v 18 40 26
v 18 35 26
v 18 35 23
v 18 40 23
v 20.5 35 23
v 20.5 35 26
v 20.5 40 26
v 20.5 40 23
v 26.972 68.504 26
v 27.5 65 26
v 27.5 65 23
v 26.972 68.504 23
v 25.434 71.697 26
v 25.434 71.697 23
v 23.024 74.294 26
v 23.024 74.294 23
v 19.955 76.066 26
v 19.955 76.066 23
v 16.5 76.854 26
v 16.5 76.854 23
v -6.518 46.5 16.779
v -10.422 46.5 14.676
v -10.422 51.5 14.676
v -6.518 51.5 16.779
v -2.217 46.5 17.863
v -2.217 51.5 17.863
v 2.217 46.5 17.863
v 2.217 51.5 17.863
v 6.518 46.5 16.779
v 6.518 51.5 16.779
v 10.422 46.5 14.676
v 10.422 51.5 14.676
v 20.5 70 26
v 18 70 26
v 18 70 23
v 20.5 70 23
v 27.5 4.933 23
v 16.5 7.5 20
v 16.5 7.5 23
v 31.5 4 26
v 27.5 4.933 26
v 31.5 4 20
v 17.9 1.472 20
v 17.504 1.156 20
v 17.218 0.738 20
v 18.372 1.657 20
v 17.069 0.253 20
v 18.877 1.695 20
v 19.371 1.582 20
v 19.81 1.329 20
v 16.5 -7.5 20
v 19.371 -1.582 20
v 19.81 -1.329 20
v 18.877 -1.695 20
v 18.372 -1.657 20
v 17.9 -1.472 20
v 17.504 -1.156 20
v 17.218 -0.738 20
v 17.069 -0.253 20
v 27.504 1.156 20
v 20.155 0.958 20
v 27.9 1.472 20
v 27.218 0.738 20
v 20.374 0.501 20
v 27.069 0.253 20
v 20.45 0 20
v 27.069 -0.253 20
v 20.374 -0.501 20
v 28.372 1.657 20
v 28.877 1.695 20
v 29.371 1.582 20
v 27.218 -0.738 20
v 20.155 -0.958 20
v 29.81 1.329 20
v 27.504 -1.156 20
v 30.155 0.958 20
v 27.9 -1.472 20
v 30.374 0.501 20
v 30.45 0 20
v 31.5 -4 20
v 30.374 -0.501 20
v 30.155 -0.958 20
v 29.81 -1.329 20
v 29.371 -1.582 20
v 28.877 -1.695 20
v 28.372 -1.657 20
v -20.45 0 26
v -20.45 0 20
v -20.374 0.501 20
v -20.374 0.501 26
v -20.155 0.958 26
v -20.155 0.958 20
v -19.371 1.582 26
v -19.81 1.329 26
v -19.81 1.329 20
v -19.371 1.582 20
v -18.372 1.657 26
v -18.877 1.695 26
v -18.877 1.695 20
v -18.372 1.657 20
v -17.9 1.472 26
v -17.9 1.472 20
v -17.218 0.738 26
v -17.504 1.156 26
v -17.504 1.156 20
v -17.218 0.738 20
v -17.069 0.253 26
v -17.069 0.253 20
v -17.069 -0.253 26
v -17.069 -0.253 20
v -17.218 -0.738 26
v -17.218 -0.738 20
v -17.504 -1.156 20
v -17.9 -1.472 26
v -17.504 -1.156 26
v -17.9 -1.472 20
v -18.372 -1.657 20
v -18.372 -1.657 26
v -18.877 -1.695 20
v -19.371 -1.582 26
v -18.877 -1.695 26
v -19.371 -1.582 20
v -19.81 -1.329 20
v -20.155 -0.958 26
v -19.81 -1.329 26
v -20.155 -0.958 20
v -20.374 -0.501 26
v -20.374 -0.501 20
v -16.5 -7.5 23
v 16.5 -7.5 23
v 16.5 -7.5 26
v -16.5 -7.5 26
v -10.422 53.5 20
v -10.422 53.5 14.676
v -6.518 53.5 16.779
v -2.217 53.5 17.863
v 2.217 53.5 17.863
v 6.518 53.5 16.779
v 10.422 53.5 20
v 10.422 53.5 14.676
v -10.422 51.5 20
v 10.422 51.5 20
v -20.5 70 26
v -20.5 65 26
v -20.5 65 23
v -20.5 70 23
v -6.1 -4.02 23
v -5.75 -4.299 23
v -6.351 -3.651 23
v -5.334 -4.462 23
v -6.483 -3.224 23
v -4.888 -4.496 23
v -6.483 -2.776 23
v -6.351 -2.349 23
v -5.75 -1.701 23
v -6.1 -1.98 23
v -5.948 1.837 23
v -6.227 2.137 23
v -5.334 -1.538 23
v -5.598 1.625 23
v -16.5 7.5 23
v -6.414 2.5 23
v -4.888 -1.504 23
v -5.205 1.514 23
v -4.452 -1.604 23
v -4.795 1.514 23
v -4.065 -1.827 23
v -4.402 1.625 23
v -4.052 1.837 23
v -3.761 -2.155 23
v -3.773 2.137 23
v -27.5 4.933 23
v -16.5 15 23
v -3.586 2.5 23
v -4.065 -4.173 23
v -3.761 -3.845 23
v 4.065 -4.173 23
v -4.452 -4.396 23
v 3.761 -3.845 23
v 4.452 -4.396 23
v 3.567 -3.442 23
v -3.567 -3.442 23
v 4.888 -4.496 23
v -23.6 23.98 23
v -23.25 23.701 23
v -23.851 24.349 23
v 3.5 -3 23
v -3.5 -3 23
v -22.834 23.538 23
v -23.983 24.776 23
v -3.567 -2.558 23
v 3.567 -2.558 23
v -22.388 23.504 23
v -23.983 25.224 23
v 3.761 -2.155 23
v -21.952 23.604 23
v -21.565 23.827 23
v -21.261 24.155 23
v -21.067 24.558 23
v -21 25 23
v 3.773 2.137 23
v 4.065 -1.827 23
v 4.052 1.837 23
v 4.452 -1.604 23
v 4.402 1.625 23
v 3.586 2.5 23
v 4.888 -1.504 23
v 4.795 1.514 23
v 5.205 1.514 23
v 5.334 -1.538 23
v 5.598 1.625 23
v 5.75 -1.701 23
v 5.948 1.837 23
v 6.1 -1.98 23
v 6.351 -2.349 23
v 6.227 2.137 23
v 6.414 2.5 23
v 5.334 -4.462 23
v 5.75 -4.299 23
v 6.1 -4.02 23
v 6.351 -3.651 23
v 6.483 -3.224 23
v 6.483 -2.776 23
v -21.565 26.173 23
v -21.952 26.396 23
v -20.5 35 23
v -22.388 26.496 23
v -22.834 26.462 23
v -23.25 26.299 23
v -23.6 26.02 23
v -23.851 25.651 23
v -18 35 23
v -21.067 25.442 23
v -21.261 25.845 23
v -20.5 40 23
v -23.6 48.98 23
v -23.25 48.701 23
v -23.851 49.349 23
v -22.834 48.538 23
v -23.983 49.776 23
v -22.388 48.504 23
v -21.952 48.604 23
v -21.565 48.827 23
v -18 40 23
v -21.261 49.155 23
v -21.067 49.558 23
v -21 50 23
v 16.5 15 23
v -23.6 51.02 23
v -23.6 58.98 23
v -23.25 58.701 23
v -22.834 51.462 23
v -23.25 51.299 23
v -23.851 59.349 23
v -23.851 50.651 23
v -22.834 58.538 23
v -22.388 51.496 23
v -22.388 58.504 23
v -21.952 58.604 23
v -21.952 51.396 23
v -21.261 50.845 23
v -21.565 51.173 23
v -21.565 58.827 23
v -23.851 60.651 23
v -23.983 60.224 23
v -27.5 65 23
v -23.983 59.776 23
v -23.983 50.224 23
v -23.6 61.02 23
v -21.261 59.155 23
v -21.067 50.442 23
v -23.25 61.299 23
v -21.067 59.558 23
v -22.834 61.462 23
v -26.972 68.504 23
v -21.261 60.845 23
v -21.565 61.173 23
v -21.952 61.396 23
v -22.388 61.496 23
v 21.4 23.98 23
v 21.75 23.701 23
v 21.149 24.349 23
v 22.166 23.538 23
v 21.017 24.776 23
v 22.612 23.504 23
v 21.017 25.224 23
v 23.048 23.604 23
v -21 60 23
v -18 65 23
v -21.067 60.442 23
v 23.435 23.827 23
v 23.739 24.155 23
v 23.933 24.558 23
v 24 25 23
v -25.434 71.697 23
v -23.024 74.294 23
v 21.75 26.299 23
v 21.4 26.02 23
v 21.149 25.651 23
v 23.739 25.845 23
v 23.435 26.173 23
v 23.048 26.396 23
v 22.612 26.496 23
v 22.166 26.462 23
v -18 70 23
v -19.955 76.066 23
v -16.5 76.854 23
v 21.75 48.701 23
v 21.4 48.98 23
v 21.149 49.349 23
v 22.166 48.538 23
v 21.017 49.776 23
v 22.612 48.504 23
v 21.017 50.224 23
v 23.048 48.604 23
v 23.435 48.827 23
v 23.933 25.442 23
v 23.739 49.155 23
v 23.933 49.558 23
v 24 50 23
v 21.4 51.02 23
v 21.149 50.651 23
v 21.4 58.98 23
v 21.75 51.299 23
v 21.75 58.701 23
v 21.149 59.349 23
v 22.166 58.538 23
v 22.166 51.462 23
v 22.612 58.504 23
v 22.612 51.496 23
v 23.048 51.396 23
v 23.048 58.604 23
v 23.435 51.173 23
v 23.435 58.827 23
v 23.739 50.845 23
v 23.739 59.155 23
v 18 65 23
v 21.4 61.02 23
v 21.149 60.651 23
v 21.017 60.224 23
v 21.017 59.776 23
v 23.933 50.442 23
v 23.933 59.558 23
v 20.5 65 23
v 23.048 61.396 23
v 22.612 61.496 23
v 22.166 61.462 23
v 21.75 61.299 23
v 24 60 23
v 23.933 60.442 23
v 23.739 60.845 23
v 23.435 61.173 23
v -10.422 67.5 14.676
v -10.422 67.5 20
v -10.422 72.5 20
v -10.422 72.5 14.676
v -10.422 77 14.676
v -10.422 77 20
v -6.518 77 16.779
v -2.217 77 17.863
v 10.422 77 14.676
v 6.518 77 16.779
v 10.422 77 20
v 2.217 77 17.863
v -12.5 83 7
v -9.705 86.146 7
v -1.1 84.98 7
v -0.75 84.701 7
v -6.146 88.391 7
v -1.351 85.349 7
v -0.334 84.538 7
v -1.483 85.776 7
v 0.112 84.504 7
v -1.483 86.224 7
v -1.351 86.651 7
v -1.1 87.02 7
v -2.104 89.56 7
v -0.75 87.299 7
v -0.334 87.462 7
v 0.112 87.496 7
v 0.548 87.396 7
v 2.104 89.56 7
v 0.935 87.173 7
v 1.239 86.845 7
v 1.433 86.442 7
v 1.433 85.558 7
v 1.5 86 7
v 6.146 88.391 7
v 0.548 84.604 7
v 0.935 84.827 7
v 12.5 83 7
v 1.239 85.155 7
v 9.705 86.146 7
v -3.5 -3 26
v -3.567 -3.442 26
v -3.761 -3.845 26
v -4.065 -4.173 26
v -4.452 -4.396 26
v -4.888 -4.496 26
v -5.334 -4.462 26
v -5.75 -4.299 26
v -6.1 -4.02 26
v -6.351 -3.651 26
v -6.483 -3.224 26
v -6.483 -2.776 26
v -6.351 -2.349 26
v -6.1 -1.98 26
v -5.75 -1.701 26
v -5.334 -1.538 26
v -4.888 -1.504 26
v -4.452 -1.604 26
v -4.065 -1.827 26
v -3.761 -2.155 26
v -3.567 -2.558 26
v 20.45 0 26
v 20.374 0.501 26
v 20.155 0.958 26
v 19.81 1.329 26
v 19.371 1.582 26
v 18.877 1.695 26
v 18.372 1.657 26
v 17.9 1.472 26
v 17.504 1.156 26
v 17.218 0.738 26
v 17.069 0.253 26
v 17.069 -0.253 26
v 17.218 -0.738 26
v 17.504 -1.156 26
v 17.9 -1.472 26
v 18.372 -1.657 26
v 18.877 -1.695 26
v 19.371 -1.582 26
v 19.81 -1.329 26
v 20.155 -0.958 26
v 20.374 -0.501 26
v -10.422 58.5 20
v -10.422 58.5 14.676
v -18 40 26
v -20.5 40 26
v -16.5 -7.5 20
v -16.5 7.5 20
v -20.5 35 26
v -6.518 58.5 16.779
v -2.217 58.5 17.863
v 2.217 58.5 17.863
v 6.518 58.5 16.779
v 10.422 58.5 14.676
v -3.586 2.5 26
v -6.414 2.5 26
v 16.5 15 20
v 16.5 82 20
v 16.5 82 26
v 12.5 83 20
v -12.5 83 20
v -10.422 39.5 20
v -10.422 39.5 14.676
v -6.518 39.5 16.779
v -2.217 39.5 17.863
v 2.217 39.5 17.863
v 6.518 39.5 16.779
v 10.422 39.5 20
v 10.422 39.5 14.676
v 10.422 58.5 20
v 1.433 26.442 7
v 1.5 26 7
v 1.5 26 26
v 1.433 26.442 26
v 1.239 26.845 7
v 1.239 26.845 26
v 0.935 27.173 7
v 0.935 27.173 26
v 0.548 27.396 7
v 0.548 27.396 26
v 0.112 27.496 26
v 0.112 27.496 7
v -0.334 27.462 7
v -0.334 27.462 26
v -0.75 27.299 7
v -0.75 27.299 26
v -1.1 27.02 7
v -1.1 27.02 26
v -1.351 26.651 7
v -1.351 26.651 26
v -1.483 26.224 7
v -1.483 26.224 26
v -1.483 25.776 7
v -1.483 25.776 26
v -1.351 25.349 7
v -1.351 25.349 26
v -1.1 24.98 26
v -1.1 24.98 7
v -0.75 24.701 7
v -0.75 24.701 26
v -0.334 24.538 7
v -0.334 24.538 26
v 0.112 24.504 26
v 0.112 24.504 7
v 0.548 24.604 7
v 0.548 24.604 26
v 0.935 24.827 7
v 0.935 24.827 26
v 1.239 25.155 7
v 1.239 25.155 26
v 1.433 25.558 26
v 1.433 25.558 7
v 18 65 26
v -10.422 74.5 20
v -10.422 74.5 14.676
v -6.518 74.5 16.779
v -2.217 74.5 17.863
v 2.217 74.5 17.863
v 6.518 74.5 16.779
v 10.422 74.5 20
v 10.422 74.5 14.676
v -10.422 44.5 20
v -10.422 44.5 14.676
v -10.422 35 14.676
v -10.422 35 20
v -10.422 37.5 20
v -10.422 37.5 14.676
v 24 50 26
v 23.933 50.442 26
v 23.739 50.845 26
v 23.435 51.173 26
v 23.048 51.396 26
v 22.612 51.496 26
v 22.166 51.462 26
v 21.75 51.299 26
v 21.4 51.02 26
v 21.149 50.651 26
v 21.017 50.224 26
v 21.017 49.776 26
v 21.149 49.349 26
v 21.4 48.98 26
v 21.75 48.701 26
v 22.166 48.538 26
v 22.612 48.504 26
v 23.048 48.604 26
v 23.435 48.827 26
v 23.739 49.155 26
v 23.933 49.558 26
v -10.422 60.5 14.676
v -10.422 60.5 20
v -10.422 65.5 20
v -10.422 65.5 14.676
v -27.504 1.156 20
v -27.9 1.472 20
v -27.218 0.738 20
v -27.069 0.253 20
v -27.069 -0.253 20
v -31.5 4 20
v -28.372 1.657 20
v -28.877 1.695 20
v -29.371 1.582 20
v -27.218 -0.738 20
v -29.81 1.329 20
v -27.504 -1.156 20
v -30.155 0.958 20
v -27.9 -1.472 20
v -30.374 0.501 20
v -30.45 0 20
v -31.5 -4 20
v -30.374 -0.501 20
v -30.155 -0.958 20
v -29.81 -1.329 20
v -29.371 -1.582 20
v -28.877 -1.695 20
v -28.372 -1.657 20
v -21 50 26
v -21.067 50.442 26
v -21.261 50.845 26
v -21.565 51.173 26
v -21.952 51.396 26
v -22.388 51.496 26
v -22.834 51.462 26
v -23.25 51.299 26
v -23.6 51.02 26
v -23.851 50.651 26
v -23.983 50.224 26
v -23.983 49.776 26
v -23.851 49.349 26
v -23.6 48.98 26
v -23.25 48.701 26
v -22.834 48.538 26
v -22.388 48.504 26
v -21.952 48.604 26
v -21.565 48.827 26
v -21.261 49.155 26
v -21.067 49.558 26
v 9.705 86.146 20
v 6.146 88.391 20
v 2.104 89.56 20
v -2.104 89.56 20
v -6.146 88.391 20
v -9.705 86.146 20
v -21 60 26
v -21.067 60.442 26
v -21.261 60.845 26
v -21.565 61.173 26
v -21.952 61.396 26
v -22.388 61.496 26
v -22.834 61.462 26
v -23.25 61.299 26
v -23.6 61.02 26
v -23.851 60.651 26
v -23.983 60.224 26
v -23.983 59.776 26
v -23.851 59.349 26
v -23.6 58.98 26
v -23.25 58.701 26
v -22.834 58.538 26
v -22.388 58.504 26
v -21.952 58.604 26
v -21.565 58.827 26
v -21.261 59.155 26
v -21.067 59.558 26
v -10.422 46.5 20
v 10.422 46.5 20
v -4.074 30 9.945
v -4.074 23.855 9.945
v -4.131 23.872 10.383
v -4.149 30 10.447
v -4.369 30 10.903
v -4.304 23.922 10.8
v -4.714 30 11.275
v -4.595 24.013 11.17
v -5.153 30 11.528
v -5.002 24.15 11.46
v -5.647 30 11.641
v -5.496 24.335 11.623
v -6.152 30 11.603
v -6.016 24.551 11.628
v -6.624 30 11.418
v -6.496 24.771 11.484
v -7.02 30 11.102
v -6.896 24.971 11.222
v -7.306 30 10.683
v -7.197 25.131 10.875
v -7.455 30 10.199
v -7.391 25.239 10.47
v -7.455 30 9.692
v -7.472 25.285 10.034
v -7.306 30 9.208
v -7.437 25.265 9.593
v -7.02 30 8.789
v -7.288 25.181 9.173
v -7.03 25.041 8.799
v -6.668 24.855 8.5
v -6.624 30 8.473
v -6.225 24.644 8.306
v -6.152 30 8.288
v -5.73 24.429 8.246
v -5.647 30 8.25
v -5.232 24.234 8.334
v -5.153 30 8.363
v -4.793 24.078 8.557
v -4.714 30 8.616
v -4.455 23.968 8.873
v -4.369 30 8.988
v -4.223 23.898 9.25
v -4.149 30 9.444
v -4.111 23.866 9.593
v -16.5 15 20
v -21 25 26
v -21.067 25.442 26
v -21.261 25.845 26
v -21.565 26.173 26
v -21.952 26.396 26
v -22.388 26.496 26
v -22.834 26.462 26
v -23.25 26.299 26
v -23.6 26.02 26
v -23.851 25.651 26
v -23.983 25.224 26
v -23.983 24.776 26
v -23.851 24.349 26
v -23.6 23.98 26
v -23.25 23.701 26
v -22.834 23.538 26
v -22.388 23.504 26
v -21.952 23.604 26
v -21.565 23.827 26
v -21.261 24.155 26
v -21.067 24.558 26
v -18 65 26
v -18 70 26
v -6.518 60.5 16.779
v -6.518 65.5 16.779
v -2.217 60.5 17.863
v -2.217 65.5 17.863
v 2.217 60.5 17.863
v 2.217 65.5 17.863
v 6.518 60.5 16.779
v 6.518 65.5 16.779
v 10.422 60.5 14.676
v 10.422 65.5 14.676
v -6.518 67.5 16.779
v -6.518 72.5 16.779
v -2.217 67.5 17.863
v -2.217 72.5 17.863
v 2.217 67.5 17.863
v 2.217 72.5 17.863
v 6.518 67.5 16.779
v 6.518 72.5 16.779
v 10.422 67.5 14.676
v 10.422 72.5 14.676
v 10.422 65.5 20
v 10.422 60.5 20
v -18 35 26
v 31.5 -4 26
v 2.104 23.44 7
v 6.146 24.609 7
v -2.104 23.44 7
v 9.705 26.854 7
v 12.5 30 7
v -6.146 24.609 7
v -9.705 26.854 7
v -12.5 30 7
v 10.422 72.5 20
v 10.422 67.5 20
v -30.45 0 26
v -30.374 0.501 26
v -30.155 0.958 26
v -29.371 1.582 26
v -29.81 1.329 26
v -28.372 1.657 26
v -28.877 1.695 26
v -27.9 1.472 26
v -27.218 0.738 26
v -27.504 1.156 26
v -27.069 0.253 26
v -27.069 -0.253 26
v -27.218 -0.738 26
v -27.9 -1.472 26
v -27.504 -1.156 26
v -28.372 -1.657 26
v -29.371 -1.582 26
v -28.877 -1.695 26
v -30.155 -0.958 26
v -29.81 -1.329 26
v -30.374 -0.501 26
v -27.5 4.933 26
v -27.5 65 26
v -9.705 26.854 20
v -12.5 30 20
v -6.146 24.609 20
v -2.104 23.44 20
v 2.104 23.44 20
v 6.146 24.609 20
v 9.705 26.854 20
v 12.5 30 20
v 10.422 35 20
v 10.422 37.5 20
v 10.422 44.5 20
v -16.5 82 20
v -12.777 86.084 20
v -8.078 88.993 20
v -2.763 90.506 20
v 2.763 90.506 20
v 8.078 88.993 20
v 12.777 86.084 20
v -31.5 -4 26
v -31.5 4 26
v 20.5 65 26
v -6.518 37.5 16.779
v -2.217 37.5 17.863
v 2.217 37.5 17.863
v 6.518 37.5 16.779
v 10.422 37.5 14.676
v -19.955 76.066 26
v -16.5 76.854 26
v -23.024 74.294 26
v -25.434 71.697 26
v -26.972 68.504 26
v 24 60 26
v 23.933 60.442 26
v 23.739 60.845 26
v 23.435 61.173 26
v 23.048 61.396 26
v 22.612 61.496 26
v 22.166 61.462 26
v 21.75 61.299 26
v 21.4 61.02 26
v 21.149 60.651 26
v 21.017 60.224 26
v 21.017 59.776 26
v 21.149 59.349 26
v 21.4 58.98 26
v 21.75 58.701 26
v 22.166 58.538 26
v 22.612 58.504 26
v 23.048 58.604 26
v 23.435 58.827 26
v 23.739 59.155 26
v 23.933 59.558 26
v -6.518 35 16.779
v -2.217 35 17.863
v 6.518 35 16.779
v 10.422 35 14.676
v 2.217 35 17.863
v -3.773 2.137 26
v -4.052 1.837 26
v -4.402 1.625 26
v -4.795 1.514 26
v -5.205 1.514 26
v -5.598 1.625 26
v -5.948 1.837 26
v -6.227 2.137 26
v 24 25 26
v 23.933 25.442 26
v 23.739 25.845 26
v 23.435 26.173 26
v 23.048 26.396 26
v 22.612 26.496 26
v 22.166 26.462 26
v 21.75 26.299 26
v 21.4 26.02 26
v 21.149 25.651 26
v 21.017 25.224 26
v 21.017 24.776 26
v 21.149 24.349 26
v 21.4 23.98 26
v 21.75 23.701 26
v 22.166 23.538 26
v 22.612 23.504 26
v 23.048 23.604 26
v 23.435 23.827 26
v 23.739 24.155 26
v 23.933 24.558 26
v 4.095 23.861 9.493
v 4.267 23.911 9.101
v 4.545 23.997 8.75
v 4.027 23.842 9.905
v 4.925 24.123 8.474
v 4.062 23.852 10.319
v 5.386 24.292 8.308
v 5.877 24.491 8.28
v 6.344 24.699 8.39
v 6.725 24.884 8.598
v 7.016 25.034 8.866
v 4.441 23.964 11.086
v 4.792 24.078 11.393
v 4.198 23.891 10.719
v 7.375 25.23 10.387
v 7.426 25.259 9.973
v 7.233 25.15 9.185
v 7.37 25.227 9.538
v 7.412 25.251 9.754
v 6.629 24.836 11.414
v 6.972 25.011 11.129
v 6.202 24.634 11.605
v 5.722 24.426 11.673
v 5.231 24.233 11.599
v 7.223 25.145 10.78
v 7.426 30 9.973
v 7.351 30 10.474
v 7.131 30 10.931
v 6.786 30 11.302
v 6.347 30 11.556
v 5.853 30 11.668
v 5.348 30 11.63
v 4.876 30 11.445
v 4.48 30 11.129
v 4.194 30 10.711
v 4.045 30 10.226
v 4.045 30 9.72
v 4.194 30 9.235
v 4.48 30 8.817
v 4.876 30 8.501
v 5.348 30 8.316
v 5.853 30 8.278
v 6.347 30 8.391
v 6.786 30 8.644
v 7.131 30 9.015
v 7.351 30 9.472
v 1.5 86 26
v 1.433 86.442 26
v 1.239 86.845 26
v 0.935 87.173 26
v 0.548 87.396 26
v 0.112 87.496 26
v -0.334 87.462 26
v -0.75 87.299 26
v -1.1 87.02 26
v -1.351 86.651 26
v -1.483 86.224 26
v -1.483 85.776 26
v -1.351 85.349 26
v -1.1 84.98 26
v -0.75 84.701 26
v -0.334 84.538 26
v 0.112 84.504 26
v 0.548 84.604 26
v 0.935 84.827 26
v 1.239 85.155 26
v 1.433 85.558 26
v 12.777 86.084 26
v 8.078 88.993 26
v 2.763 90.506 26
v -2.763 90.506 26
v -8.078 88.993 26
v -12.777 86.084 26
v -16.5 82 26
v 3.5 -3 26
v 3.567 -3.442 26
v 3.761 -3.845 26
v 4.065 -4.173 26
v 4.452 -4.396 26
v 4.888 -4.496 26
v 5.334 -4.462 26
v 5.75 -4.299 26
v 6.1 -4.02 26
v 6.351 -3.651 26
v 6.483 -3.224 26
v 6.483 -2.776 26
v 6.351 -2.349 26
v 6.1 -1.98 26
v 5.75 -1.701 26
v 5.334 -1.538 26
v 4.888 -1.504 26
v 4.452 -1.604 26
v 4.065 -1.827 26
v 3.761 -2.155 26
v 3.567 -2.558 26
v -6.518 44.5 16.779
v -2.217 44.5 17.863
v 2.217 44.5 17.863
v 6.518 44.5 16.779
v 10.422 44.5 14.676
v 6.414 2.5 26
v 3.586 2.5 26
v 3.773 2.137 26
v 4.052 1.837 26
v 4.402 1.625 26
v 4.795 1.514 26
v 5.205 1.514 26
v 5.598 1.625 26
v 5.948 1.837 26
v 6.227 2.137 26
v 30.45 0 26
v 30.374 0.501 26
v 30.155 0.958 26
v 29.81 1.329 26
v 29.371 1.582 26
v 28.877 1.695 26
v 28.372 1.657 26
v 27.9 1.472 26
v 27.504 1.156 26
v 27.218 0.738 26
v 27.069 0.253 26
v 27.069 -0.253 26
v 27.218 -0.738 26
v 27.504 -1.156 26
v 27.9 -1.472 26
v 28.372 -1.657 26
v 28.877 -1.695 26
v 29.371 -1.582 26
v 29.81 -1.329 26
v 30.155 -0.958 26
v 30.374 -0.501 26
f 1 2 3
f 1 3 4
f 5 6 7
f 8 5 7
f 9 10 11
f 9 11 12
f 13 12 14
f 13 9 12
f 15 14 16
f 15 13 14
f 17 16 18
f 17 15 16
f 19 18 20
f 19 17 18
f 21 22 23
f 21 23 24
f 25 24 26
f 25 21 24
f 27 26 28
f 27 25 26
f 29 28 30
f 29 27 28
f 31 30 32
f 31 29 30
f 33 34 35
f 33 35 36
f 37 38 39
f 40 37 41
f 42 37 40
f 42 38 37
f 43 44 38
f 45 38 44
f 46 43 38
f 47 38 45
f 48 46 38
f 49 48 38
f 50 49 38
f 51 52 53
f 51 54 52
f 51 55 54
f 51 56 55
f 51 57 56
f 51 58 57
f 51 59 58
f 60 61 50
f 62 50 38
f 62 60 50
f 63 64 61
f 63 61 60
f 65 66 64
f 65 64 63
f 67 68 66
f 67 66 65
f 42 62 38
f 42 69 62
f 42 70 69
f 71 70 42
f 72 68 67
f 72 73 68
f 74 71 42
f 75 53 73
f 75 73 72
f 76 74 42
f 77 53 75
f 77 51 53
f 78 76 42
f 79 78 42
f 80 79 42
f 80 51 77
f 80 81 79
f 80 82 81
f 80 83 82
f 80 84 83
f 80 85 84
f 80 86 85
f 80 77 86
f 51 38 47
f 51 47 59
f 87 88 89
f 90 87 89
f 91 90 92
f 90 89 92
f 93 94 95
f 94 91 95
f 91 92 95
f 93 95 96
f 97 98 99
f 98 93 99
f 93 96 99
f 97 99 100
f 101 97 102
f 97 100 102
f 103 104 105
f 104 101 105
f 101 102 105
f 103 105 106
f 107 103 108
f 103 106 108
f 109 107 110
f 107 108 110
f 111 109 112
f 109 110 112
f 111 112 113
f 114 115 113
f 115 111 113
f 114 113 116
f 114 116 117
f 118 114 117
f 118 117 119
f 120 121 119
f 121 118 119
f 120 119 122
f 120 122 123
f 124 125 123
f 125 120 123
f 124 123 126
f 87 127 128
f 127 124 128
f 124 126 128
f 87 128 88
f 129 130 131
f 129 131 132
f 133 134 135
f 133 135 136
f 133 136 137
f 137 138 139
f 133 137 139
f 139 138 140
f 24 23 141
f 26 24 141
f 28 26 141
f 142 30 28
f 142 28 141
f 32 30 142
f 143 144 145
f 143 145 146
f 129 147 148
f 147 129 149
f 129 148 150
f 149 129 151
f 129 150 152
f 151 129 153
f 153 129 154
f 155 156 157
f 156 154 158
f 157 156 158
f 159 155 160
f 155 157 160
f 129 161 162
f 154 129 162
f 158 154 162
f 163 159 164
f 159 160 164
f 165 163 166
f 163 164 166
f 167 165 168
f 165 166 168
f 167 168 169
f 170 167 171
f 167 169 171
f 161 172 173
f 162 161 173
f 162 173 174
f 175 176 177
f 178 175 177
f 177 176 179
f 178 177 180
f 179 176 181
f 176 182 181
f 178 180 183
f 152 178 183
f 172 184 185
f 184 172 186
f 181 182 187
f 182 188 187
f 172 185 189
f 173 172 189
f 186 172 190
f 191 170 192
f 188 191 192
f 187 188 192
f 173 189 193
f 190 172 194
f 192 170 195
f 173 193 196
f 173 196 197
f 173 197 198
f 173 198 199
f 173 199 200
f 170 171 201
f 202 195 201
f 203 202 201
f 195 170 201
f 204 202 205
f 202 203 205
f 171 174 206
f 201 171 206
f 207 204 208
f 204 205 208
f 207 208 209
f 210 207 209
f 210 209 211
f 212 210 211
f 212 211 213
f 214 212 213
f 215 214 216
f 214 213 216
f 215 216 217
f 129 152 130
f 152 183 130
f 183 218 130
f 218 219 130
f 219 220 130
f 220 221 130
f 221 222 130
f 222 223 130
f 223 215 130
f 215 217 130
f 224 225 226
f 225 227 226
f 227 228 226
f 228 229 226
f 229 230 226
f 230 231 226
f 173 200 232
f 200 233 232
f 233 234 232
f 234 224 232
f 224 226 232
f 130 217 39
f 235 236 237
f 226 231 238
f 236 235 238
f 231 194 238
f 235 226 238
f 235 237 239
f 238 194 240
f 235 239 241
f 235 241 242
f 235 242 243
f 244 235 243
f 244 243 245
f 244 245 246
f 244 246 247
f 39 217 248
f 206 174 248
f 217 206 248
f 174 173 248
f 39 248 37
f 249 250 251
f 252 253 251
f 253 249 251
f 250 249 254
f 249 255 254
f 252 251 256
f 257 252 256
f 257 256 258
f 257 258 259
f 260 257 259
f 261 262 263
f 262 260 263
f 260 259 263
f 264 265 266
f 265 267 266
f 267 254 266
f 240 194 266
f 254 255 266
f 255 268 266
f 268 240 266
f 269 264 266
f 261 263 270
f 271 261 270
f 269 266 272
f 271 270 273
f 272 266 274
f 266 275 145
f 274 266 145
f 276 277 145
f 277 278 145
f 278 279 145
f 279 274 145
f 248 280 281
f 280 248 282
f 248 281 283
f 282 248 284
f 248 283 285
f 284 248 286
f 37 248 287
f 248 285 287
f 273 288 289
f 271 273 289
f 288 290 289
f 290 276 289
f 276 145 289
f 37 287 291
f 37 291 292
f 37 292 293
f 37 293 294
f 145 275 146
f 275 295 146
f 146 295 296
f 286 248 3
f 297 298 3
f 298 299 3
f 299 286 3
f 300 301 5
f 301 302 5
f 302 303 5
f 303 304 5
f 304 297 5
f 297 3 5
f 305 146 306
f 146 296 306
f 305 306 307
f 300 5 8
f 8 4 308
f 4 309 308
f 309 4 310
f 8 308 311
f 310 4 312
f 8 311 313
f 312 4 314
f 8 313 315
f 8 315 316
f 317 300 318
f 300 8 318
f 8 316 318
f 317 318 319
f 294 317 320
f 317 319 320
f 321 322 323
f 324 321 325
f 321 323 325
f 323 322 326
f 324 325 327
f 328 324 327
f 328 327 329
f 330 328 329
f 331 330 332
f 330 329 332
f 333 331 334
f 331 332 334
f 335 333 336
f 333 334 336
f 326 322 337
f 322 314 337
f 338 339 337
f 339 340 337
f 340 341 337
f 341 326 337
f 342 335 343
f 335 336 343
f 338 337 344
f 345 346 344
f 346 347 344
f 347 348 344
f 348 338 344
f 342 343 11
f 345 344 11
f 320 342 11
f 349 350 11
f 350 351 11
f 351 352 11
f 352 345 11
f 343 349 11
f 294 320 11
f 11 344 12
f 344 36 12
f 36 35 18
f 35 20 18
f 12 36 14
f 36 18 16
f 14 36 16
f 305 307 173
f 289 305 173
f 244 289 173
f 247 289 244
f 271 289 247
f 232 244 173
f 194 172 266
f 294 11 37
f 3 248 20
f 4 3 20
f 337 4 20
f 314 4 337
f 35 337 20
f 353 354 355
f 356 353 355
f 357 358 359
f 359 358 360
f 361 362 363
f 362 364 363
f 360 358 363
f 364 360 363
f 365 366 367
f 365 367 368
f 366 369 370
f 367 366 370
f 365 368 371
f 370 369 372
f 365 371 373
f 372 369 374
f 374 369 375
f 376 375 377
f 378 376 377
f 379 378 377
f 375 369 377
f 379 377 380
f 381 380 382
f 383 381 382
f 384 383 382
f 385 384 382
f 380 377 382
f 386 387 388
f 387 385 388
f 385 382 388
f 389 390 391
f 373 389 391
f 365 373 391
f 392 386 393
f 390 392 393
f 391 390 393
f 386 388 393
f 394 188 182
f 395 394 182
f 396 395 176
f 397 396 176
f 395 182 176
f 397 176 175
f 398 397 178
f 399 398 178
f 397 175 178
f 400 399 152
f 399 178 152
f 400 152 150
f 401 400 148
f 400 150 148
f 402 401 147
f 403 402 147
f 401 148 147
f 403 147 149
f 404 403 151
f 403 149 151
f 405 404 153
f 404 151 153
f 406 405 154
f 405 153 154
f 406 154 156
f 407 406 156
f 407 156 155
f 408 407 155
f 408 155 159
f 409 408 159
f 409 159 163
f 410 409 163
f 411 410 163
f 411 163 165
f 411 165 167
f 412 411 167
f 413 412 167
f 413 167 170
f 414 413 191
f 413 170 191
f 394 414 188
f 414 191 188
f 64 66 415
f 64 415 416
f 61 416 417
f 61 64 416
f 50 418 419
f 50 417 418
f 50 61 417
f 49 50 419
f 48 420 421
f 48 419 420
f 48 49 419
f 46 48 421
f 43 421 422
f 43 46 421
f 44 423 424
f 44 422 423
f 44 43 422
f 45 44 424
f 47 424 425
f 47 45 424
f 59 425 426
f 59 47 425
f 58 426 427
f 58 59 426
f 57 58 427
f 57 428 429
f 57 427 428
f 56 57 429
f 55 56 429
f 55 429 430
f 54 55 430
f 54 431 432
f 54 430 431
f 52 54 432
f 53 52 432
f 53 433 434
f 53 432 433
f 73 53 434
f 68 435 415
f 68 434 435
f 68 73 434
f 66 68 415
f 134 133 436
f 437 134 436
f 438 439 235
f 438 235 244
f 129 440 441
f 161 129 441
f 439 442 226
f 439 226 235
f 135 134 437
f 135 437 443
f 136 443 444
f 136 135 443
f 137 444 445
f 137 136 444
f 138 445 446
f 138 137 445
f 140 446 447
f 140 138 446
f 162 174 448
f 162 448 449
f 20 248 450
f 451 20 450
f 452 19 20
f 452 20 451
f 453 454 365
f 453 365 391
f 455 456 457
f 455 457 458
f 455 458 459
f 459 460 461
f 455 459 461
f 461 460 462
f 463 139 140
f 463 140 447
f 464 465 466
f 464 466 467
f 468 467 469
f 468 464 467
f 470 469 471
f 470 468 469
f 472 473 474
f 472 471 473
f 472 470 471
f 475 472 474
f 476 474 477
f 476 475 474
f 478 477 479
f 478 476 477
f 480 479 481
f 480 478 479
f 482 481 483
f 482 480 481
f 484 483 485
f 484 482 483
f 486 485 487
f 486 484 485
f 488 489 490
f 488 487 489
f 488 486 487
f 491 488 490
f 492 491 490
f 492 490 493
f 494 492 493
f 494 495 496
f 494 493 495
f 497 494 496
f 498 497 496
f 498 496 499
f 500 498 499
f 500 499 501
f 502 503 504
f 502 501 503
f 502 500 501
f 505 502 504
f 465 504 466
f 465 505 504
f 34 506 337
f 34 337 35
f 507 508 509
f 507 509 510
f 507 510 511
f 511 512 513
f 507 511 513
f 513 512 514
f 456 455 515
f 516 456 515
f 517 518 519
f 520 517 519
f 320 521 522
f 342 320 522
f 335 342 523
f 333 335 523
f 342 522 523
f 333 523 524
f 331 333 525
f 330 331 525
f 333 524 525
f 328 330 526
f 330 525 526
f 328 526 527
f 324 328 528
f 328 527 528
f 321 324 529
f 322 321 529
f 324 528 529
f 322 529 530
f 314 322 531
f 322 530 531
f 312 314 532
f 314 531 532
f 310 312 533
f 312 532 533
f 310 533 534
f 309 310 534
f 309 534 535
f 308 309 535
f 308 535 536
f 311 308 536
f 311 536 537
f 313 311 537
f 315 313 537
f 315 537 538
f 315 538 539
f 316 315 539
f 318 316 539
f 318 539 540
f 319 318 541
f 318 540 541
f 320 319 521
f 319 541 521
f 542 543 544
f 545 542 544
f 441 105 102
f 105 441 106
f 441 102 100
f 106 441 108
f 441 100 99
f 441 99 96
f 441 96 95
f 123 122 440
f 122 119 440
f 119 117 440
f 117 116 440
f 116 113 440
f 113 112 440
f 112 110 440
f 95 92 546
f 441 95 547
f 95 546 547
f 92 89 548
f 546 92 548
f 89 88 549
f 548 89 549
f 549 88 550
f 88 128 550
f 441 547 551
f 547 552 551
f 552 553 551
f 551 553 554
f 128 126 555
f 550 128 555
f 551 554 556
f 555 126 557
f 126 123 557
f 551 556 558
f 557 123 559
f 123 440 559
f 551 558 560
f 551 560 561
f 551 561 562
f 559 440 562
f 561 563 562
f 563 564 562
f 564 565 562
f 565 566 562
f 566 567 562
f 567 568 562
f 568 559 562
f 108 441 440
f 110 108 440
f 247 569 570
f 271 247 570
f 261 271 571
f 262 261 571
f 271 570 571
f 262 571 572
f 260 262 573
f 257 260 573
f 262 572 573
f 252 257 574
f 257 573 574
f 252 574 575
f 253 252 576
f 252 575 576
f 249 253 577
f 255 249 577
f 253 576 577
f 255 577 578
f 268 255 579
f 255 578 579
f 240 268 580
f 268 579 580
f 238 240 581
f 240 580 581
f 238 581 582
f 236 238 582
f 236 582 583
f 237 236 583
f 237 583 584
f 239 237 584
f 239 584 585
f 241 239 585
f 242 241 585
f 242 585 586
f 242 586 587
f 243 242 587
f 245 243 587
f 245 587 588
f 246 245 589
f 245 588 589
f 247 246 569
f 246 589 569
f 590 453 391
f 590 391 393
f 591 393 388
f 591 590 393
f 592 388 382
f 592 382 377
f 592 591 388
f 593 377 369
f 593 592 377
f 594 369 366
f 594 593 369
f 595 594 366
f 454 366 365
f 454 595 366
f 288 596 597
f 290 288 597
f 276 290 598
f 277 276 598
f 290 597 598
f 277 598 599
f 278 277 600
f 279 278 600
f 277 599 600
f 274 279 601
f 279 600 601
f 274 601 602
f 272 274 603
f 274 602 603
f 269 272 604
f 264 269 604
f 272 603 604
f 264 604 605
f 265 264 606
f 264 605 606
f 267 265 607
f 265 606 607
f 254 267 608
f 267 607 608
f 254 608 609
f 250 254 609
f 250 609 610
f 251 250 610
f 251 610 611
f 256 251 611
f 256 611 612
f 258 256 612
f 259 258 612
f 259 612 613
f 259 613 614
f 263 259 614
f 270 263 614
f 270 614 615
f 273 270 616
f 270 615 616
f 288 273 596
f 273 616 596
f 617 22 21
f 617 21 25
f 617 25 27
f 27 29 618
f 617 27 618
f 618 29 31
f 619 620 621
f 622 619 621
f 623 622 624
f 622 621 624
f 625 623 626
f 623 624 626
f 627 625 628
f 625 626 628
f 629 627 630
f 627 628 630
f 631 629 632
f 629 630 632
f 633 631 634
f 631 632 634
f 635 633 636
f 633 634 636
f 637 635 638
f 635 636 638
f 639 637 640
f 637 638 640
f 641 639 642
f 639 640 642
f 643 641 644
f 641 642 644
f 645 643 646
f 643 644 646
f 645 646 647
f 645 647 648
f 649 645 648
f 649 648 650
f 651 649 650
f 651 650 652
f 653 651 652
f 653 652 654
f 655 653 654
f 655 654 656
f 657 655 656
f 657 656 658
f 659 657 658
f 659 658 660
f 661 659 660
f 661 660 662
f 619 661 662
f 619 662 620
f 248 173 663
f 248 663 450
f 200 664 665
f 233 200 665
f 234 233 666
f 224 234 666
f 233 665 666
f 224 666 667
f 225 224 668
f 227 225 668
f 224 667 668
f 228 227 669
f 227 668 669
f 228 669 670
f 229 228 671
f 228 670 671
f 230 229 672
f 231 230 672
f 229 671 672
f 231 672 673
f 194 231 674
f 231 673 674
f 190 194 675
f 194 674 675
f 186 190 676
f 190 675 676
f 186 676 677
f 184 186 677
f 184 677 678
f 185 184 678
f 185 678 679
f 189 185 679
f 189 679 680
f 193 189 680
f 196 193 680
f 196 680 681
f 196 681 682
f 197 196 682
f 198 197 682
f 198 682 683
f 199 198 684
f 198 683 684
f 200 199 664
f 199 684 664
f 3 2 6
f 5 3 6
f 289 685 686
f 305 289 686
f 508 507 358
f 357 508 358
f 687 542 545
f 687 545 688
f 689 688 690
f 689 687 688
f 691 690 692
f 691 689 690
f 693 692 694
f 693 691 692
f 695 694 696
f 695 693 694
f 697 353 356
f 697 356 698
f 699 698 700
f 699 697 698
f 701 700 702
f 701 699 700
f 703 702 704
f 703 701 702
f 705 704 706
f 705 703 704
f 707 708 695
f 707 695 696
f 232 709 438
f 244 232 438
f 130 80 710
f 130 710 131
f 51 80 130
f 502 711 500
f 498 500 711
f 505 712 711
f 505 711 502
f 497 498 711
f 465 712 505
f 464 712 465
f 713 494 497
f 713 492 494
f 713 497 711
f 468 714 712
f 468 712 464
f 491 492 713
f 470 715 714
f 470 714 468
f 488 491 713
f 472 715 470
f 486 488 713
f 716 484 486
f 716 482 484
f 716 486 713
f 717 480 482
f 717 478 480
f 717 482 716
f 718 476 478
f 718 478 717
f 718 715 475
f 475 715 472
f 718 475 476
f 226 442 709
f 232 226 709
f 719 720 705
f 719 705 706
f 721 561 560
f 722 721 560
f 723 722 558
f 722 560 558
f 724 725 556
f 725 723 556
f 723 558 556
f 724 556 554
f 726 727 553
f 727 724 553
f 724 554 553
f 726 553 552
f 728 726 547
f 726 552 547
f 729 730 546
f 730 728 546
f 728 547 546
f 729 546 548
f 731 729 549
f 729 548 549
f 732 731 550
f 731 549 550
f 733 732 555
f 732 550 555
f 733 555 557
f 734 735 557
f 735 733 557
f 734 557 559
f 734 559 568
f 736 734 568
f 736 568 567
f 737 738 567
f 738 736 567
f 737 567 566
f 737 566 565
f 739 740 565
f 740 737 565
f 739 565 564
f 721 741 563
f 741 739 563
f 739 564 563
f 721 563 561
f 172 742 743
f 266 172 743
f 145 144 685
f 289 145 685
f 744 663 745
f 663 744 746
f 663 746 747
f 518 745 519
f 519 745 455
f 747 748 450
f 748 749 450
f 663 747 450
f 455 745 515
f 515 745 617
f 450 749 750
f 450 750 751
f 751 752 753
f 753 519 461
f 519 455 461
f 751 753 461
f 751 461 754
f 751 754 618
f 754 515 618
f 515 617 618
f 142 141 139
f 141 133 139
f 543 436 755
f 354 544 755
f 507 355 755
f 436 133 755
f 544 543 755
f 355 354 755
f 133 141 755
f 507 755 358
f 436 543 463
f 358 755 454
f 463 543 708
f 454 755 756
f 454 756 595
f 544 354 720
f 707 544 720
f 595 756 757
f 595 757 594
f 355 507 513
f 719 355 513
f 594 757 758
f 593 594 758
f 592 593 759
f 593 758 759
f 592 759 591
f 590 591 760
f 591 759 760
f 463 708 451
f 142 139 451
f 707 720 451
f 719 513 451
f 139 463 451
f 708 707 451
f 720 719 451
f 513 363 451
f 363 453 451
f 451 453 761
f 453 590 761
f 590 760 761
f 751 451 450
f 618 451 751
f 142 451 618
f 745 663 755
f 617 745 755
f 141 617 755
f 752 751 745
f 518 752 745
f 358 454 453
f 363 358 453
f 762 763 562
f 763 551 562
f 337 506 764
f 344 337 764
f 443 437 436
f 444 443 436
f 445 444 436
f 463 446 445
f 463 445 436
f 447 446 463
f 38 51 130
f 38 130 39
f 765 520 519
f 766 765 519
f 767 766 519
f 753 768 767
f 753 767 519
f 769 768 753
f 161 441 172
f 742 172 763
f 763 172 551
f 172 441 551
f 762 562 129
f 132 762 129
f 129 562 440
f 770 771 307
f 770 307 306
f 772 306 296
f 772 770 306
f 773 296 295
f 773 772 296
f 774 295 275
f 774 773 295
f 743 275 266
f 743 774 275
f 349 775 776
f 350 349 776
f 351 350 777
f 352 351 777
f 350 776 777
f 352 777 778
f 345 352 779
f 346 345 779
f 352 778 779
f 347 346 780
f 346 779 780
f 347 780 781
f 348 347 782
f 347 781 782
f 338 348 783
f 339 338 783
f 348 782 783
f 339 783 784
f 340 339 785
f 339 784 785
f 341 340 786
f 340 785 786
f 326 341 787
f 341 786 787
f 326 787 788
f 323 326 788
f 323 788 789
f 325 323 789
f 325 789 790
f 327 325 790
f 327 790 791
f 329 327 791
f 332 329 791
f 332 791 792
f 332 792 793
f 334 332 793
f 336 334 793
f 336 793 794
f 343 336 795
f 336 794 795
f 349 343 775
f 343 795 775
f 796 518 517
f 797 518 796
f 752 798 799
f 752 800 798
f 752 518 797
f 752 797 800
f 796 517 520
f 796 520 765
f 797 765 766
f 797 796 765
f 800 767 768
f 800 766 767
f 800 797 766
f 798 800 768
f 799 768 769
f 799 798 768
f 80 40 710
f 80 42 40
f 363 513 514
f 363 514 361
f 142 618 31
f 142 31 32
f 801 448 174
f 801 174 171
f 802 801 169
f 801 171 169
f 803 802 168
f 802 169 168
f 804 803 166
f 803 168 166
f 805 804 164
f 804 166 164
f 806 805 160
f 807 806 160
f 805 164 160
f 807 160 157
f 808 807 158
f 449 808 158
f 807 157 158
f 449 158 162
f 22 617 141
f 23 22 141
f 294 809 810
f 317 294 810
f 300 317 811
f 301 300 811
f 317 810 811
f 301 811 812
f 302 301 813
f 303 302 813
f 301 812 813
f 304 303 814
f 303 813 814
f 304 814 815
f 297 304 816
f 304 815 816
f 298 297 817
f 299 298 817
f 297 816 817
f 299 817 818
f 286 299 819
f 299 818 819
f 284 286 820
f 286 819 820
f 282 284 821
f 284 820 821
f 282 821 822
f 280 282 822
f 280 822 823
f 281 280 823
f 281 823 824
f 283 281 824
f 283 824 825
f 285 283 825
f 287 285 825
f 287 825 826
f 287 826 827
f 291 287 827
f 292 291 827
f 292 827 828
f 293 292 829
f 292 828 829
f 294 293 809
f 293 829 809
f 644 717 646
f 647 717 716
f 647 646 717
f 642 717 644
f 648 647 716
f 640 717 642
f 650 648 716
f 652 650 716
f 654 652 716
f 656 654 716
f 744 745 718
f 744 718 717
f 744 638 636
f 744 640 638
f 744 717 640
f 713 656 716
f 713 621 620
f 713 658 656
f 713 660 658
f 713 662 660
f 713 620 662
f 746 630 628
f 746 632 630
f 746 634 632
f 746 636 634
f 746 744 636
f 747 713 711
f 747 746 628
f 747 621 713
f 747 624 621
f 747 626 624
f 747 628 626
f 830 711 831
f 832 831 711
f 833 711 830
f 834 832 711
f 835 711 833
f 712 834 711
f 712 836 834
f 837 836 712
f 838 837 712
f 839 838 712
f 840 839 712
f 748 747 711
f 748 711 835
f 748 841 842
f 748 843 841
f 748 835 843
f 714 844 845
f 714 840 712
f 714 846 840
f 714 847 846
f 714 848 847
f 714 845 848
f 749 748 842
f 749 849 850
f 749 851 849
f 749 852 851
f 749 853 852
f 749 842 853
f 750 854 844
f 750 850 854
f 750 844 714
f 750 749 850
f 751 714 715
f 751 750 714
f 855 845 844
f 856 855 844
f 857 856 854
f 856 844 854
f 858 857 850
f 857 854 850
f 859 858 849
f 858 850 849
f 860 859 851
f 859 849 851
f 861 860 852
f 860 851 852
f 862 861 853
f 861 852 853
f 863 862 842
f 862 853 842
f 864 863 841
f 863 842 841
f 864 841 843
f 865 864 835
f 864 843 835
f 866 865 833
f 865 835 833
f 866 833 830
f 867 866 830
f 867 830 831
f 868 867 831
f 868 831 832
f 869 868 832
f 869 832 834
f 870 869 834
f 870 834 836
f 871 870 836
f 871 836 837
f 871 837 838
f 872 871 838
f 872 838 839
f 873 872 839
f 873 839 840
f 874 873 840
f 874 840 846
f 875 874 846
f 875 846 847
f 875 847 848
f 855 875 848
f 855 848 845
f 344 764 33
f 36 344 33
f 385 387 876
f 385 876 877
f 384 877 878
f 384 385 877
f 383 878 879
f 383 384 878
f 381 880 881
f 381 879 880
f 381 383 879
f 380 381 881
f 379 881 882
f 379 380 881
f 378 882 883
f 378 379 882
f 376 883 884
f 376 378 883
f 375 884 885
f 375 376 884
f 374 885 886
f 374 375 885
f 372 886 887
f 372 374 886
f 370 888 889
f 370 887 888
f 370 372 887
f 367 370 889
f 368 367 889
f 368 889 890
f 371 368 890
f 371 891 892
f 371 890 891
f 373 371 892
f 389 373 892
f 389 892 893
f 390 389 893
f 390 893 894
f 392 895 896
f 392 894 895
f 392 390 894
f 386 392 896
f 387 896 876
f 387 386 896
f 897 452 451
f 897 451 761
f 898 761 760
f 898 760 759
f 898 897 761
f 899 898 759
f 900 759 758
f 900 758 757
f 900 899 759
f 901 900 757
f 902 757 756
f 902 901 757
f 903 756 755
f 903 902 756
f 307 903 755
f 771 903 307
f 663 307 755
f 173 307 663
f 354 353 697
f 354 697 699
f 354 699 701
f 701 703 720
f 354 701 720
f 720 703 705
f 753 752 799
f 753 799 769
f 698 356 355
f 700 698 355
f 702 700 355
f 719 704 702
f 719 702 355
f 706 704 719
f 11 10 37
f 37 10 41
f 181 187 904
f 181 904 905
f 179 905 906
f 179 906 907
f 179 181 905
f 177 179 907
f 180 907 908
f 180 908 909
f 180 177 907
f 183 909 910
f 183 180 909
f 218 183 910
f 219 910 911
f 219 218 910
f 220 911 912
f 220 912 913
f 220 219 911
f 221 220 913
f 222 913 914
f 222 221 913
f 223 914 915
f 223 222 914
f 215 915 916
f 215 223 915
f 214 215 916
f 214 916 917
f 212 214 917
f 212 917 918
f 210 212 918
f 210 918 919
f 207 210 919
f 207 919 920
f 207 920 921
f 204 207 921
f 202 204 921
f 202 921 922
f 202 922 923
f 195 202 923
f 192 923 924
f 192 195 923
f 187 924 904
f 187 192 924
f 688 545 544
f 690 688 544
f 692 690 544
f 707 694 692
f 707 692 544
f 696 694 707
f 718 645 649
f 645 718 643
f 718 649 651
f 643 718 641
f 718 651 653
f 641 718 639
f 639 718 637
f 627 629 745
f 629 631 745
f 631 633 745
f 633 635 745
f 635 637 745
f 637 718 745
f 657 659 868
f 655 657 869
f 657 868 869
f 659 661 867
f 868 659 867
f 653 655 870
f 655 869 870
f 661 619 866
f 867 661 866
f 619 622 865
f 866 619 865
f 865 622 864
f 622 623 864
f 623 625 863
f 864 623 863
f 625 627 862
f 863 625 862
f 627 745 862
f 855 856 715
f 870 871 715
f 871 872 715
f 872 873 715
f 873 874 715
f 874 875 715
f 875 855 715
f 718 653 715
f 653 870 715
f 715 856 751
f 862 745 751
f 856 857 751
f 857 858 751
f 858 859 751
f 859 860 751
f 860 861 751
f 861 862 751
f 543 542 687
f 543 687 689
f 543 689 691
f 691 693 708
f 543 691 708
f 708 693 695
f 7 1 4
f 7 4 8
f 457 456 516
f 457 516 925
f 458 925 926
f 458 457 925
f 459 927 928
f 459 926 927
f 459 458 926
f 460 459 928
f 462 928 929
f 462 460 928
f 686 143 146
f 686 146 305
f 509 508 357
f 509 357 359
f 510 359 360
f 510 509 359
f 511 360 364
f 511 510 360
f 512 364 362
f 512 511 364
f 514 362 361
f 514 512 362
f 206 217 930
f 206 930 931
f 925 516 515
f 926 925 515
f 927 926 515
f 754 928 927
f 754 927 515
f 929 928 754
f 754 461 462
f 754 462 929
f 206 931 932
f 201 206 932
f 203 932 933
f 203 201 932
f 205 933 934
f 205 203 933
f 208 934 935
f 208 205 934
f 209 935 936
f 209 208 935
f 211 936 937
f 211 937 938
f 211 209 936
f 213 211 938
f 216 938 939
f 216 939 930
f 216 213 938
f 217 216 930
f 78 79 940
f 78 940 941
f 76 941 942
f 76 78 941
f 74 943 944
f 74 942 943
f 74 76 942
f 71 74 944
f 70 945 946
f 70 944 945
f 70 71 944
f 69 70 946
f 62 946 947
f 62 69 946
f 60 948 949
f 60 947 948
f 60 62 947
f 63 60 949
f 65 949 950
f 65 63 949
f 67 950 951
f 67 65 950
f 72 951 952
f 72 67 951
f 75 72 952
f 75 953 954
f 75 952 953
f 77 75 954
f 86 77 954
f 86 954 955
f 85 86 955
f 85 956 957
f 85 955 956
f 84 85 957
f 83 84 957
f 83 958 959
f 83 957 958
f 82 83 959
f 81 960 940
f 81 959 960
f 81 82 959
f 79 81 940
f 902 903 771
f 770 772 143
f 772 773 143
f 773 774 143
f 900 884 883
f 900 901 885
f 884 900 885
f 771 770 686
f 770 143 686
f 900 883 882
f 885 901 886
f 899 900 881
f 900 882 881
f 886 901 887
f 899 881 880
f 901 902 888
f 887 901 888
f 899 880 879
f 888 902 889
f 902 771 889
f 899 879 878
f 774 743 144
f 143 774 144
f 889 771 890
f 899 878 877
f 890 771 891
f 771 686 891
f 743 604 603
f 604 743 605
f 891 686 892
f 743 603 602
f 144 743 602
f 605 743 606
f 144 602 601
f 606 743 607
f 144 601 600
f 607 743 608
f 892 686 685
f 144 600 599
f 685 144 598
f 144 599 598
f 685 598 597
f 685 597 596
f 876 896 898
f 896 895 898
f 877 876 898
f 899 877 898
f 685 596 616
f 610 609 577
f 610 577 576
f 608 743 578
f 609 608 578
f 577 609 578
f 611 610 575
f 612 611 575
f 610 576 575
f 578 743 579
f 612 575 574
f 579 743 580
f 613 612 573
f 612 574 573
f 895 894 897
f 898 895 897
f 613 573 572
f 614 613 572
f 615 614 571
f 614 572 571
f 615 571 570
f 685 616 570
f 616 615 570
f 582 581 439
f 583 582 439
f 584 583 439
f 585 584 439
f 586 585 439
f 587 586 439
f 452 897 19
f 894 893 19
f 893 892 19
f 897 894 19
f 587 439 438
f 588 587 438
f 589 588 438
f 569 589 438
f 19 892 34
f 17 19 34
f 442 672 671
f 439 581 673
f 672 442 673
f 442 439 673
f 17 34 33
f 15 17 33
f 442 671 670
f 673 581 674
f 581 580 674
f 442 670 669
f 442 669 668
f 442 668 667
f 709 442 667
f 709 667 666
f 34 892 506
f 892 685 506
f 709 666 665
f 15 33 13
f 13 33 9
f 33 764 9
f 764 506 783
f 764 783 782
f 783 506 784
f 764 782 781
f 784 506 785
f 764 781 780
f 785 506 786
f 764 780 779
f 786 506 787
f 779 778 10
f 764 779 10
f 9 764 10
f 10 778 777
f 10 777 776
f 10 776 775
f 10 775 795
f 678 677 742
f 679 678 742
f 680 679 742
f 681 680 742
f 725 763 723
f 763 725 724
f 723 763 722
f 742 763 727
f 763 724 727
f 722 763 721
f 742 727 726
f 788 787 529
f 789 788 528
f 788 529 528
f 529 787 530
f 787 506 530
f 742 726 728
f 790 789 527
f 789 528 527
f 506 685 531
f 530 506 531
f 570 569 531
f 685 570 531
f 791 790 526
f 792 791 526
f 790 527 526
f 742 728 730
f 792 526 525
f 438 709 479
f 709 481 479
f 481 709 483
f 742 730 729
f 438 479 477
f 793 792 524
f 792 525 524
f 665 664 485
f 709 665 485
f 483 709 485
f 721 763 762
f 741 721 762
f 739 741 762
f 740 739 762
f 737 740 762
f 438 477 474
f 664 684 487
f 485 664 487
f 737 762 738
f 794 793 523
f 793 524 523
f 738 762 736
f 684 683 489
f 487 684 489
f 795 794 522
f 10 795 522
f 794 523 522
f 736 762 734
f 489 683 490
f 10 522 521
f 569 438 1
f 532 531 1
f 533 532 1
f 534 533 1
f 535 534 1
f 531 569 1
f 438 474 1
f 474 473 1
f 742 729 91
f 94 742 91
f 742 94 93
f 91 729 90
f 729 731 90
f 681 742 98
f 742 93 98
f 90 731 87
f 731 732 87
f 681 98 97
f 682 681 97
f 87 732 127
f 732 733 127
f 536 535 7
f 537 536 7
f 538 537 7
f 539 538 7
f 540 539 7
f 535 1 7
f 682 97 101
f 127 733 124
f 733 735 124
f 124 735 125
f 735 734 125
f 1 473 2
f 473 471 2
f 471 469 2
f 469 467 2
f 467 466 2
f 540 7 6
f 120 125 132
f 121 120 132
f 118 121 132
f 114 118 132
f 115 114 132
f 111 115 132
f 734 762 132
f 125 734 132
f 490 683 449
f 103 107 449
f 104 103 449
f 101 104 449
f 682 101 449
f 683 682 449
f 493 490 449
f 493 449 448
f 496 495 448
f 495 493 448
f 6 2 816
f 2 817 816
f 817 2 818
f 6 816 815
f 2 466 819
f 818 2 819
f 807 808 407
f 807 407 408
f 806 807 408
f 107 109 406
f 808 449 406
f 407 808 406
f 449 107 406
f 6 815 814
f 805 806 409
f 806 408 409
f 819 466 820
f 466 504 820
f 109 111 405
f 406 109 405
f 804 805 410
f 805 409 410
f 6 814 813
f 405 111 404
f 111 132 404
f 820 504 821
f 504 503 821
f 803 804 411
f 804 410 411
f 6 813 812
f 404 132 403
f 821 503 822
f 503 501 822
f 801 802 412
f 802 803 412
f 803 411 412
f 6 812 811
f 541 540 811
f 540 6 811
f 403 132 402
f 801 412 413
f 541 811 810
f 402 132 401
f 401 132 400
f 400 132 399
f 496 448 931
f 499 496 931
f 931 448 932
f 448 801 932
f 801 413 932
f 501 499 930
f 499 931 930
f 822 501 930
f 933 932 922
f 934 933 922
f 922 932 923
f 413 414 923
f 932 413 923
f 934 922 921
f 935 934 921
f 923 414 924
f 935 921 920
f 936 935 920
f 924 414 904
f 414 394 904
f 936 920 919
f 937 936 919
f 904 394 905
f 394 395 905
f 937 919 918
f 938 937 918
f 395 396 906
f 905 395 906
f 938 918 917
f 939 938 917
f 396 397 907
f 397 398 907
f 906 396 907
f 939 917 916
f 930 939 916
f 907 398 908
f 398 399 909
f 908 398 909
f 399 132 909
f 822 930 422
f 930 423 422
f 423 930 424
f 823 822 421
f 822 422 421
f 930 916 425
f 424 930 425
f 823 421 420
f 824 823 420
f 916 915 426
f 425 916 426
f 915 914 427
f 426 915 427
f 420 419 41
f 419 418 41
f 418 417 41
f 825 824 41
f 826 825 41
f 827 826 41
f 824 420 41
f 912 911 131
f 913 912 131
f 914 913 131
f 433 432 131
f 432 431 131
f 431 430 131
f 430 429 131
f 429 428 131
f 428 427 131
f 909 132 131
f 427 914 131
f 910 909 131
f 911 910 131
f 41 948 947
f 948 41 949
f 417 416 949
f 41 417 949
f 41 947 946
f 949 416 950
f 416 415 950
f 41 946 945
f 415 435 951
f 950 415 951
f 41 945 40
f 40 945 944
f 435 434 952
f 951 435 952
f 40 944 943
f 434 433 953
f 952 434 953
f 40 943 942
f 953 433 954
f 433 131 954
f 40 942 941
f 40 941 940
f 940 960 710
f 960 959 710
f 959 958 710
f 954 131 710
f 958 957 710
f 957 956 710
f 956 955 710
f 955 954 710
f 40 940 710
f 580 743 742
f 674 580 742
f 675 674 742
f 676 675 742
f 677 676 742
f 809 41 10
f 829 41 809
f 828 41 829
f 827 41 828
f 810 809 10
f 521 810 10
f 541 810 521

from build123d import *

# Parameters (mm, degrees)
SKETCH093_R            = 1.5
PAD070_DEPTH           = 100
CYLINDER003_R          = 6
CYLINDER003_DEPTH      = 80
CYLINDER003_ROLL_ANGLE = -90
CYLINDER004_R          = 18
CYLINDER004_DEPTH      = 52.25
CYLINDER004_ROLL_ANGLE = -90
CHAMFER005_SIZE        = 3
SKETCH060_W            = 30
SKETCH060_H            = 2
PAD043_DEPTH           = 100
ARRAY001_Y_COUNT       = 15
ARRAY001_Y_PITCH       = 7
SKETCH059_W            = 20.84431
SKETCH059_H            = 42
PAD042_DEPTH           = 10
SKETCH062_R            = 1.7
PAD045_DEPTH           = 40
PAD044_DEPTH           = 13
PAD068_DEPTH           = 6
SKETCH090_R            = 1.7
PAD067_DEPTH           = 100
SKETCH089_R            = 1.5
PAD066_DEPTH           = 3
PAD065_DEPTH           = 3
SKETCH092_R            = 1.5
SKETCH092_W            = 2.5
SKETCH092_H            = 5
PAD069_DEPTH           = 3


with BuildPart() as pad070:
    # Sketch093 → Pad070 (new body)
    with BuildSketch(Plane.XY):
        with Locations((0, 86)):
            Circle(SKETCH093_R)
        with Locations((0, 26)):
            Circle(SKETCH093_R)
    extrude(amount=PAD070_DEPTH)


with BuildPart() as axlestubcutout:
    # Cylinder003 → Cylinder003 (new body)
    with BuildSketch(Plane.XY):
        Circle(CYLINDER003_R)
    extrude(amount=CYLINDER003_DEPTH)


with BuildPart() as axlestubcutout_1:
    # Cylinder003 roll: moved
    add(axlestubcutout.part.rotate(Axis((0, 0, 0), (1, 0, 0)), CYLINDER003_ROLL_ANGLE))


with BuildPart() as axlestubcutout_2:
    # Cylinder003 placement: moved
    add(axlestubcutout_1.part)


with BuildPart() as motorcutout:
    # Cylinder004 → Cylinder004 (new body)
    with BuildSketch(Plane.XY):
        Circle(CYLINDER004_R)
    extrude(amount=CYLINDER004_DEPTH)


with BuildPart() as motorcutout_1:
    # Cylinder004 roll: moved
    add(motorcutout.part.rotate(Axis((0, 0, 0), (1, 0, 0)), CYLINDER004_ROLL_ANGLE))


with BuildPart() as motorcutout_2:
    # Cylinder004 placement: moved
    add(motorcutout_1.part.moved(Location((0, 30, 0))))

    # Chamfer005
    chamfer005_edges = [motorcutout_2.edges().sort_by_distance(p)[0] for p in [
        (-18, 30, 0),
        (-18, 82.25, 0),
    ]]
    chamfer(chamfer005_edges, length=CHAMFER005_SIZE)

    # Fusion004012: union AxleStubCutout
    add(axlestubcutout_2.part)


with BuildPart() as fincutout:
    # Sketch060 → Pad043 (new body)
    with BuildSketch(Plane.XY):
        with Locations((0, 1)):
            Rectangle(SKETCH060_W, SKETCH060_H)
    extrude(amount=PAD043_DEPTH)

    # Array001 Y: FinCutout ×15


with BuildPart() as fincutout_1:
    add(fincutout.part)
    with Locations(*[(0, i * ARRAY001_Y_PITCH, 0) for i in range(1, ARRAY001_Y_COUNT)]):
        add(fincutout.part)


with BuildPart() as fincutout_2:
    # Array001 placement: moved
    add(fincutout_1.part.moved(Location((0, 2.5, 0))))


with BuildPart() as motormountfins:
    # Sketch059 → Pad042 (new body)
    with BuildSketch(Plane.XY.offset(20)):
        with Locations((0, 56)):
            Rectangle(SKETCH059_W, SKETCH059_H)
    extrude(amount=-PAD042_DEPTH)

    # Cut007012: cut FinCutout
    add(fincutout_2.part, mode=Mode.SUBTRACT)

    # Cut007013: cut MotorCutout
    add(motorcutout_2.part, mode=Mode.SUBTRACT)


with BuildPart() as motorscrewcutouts:
    # Sketch062 → Pad045 (new body)
    with BuildSketch(Plane.XZ):
        with Locations((-5.773925, 9.945441)):
            Circle(SKETCH062_R)
        with Locations((5.726042, 9.973086)):
            Circle(SKETCH062_R)
    extrude(amount=-PAD045_DEPTH)


with BuildPart() as motormountendcaps:
    # Sketch061 → Pad044 (new body)
    with BuildSketch(Plane.XY.offset(20)):
        with BuildLine():
            ThreePointArc((12.5, 83), (0, 89.708438), (-12.5, 83))
            Line((-12.5, 83), (12.5, 83))
        make_face()
        with BuildLine():
            Line((-12.5, 30), (12.5, 30))
            ThreePointArc((-12.5, 30), (0, 23.291562), (12.5, 30))
        make_face()
    extrude(amount=-PAD044_DEPTH)

    # Cut007015: cut MotorScrewCutouts
    add(motorscrewcutouts.part, mode=Mode.SUBTRACT)


with BuildPart() as pad068:
    # Sketch091 → Pad068 (new body)
    with BuildSketch(Plane.XY.offset(26)):
        with BuildLine():
            Line((-16.5, 15), (16.5, 15))
            Line((16.5, 15), (16.5, 82))
            ThreePointArc((16.5, 82), (0, 90.697345), (-16.5, 82))
            Line((-16.5, 82), (-16.5, 15))
        make_face()
    extrude(amount=-PAD068_DEPTH)


with BuildPart() as mountscrewcutouts:
    # Sketch090 → Pad067 (new body)
    with BuildSketch(Plane.XY):
        with Locations((28.75, 0)):
            Circle(SKETCH090_R)
        with Locations((18.75, 0)):
            Circle(SKETCH090_R)
    extrude(amount=PAD067_DEPTH)


with BuildPart() as baseplate:
    # Sketch089 → Pad066 (new body)
    with BuildSketch(Plane(origin=(0, 0, 23), x_dir=(-1, 0, 0), z_dir=(0, 0, 1))):
        Polygon((-31.5, -4), (-31.5, 4), (-16.5, 7.5), (0, 7.5), (0, -7.5), (-16.5, -7.5), align=None)
        with Locations((-5, 3)):
            Circle(SKETCH089_R, mode=Mode.SUBTRACT)
        with Locations((-5, -3)):
            Circle(SKETCH089_R, mode=Mode.SUBTRACT)
    extrude(amount=PAD066_DEPTH)


with BuildPart() as supportplate:
    # Sketch088 → Pad065 (new body)
    with BuildSketch(Plane(origin=(0, 0, 20), x_dir=(-1, 0, 0), z_dir=(0, 0, 1))):
        Polygon((-31.5, -4), (-31.5, 4), (-16.5, 7.5), (-16.5, -7.5), align=None)
    extrude(amount=PAD065_DEPTH)

    # Fusion004026: union BasePlate
    add(baseplate.part)

    # Cut007019005: cut MountScrewCutouts
    add(mountscrewcutouts.part, mode=Mode.SUBTRACT)


with BuildPart() as fusion004027:
    # Part__Mirroring002: instance of SupportPlate
    add(supportplate.part.mirror(Plane(origin=(0, 0, 0), x_dir=(0, -1, 0), z_dir=(1, 0, 0))))

    # Fusion004027: union SupportPlate
    add(supportplate.part)


with BuildPart() as maintopplatewithmotormount:
    # Sketch092 → Pad069 (new body)
    with BuildSketch(Plane.XY.offset(26)):
        with BuildLine():
            ThreePointArc((-15.611412, 76.887508), (-24.017848, 73.406119), (-27.5, 65))
            Line((-27.5, 2.5), (-27.5, 65))
            Line((27.5, 2.5), (-27.5, 2.5))
            Line((27.5, 65), (27.5, 2.5))
            ThreePointArc((27.5, 65), (24.018229, 73.405738), (15.612492, 76.887508))
            Line((-15.611412, 76.887508), (15.612492, 76.887508))
        make_face()
        with Locations((-22.5, 60)):
            Circle(SKETCH092_R, mode=Mode.SUBTRACT)
        with Locations((-22.5, 50)):
            Circle(SKETCH092_R, mode=Mode.SUBTRACT)
        with Locations((-22.5, 25)):
            Circle(SKETCH092_R, mode=Mode.SUBTRACT)
        with Locations((22.5, 60)):
            Circle(SKETCH092_R, mode=Mode.SUBTRACT)
        with Locations((22.5, 50)):
            Circle(SKETCH092_R, mode=Mode.SUBTRACT)
        with Locations((22.5, 25)):
            Circle(SKETCH092_R, mode=Mode.SUBTRACT)
        with Locations((-19.25, 67.5)):
            Rectangle(SKETCH092_W, SKETCH092_H, mode=Mode.SUBTRACT)
        with Locations((19.25, 67.5)):
            Rectangle(SKETCH092_W, SKETCH092_H, mode=Mode.SUBTRACT)
        with Locations((19.25, 37.5)):
            Rectangle(SKETCH092_W, SKETCH092_H, mode=Mode.SUBTRACT)
        with Locations((-19.25, 37.5)):
            Rectangle(SKETCH092_W, SKETCH092_H, mode=Mode.SUBTRACT)
    extrude(amount=-PAD069_DEPTH)

    # Fusion004028: union Pad068, Fusion004027
    add(pad068.part)
    add(fusion004027.part)

    # Fusion004029: union MotorMountFins, MotorMountEndCaps
    add(motormountfins.part)
    add(motormountendcaps.part)

    # Cut007019006: cut Pad070
    add(pad070.part, mode=Mode.SUBTRACT)


solid = maintopplatewithmotormount.part
